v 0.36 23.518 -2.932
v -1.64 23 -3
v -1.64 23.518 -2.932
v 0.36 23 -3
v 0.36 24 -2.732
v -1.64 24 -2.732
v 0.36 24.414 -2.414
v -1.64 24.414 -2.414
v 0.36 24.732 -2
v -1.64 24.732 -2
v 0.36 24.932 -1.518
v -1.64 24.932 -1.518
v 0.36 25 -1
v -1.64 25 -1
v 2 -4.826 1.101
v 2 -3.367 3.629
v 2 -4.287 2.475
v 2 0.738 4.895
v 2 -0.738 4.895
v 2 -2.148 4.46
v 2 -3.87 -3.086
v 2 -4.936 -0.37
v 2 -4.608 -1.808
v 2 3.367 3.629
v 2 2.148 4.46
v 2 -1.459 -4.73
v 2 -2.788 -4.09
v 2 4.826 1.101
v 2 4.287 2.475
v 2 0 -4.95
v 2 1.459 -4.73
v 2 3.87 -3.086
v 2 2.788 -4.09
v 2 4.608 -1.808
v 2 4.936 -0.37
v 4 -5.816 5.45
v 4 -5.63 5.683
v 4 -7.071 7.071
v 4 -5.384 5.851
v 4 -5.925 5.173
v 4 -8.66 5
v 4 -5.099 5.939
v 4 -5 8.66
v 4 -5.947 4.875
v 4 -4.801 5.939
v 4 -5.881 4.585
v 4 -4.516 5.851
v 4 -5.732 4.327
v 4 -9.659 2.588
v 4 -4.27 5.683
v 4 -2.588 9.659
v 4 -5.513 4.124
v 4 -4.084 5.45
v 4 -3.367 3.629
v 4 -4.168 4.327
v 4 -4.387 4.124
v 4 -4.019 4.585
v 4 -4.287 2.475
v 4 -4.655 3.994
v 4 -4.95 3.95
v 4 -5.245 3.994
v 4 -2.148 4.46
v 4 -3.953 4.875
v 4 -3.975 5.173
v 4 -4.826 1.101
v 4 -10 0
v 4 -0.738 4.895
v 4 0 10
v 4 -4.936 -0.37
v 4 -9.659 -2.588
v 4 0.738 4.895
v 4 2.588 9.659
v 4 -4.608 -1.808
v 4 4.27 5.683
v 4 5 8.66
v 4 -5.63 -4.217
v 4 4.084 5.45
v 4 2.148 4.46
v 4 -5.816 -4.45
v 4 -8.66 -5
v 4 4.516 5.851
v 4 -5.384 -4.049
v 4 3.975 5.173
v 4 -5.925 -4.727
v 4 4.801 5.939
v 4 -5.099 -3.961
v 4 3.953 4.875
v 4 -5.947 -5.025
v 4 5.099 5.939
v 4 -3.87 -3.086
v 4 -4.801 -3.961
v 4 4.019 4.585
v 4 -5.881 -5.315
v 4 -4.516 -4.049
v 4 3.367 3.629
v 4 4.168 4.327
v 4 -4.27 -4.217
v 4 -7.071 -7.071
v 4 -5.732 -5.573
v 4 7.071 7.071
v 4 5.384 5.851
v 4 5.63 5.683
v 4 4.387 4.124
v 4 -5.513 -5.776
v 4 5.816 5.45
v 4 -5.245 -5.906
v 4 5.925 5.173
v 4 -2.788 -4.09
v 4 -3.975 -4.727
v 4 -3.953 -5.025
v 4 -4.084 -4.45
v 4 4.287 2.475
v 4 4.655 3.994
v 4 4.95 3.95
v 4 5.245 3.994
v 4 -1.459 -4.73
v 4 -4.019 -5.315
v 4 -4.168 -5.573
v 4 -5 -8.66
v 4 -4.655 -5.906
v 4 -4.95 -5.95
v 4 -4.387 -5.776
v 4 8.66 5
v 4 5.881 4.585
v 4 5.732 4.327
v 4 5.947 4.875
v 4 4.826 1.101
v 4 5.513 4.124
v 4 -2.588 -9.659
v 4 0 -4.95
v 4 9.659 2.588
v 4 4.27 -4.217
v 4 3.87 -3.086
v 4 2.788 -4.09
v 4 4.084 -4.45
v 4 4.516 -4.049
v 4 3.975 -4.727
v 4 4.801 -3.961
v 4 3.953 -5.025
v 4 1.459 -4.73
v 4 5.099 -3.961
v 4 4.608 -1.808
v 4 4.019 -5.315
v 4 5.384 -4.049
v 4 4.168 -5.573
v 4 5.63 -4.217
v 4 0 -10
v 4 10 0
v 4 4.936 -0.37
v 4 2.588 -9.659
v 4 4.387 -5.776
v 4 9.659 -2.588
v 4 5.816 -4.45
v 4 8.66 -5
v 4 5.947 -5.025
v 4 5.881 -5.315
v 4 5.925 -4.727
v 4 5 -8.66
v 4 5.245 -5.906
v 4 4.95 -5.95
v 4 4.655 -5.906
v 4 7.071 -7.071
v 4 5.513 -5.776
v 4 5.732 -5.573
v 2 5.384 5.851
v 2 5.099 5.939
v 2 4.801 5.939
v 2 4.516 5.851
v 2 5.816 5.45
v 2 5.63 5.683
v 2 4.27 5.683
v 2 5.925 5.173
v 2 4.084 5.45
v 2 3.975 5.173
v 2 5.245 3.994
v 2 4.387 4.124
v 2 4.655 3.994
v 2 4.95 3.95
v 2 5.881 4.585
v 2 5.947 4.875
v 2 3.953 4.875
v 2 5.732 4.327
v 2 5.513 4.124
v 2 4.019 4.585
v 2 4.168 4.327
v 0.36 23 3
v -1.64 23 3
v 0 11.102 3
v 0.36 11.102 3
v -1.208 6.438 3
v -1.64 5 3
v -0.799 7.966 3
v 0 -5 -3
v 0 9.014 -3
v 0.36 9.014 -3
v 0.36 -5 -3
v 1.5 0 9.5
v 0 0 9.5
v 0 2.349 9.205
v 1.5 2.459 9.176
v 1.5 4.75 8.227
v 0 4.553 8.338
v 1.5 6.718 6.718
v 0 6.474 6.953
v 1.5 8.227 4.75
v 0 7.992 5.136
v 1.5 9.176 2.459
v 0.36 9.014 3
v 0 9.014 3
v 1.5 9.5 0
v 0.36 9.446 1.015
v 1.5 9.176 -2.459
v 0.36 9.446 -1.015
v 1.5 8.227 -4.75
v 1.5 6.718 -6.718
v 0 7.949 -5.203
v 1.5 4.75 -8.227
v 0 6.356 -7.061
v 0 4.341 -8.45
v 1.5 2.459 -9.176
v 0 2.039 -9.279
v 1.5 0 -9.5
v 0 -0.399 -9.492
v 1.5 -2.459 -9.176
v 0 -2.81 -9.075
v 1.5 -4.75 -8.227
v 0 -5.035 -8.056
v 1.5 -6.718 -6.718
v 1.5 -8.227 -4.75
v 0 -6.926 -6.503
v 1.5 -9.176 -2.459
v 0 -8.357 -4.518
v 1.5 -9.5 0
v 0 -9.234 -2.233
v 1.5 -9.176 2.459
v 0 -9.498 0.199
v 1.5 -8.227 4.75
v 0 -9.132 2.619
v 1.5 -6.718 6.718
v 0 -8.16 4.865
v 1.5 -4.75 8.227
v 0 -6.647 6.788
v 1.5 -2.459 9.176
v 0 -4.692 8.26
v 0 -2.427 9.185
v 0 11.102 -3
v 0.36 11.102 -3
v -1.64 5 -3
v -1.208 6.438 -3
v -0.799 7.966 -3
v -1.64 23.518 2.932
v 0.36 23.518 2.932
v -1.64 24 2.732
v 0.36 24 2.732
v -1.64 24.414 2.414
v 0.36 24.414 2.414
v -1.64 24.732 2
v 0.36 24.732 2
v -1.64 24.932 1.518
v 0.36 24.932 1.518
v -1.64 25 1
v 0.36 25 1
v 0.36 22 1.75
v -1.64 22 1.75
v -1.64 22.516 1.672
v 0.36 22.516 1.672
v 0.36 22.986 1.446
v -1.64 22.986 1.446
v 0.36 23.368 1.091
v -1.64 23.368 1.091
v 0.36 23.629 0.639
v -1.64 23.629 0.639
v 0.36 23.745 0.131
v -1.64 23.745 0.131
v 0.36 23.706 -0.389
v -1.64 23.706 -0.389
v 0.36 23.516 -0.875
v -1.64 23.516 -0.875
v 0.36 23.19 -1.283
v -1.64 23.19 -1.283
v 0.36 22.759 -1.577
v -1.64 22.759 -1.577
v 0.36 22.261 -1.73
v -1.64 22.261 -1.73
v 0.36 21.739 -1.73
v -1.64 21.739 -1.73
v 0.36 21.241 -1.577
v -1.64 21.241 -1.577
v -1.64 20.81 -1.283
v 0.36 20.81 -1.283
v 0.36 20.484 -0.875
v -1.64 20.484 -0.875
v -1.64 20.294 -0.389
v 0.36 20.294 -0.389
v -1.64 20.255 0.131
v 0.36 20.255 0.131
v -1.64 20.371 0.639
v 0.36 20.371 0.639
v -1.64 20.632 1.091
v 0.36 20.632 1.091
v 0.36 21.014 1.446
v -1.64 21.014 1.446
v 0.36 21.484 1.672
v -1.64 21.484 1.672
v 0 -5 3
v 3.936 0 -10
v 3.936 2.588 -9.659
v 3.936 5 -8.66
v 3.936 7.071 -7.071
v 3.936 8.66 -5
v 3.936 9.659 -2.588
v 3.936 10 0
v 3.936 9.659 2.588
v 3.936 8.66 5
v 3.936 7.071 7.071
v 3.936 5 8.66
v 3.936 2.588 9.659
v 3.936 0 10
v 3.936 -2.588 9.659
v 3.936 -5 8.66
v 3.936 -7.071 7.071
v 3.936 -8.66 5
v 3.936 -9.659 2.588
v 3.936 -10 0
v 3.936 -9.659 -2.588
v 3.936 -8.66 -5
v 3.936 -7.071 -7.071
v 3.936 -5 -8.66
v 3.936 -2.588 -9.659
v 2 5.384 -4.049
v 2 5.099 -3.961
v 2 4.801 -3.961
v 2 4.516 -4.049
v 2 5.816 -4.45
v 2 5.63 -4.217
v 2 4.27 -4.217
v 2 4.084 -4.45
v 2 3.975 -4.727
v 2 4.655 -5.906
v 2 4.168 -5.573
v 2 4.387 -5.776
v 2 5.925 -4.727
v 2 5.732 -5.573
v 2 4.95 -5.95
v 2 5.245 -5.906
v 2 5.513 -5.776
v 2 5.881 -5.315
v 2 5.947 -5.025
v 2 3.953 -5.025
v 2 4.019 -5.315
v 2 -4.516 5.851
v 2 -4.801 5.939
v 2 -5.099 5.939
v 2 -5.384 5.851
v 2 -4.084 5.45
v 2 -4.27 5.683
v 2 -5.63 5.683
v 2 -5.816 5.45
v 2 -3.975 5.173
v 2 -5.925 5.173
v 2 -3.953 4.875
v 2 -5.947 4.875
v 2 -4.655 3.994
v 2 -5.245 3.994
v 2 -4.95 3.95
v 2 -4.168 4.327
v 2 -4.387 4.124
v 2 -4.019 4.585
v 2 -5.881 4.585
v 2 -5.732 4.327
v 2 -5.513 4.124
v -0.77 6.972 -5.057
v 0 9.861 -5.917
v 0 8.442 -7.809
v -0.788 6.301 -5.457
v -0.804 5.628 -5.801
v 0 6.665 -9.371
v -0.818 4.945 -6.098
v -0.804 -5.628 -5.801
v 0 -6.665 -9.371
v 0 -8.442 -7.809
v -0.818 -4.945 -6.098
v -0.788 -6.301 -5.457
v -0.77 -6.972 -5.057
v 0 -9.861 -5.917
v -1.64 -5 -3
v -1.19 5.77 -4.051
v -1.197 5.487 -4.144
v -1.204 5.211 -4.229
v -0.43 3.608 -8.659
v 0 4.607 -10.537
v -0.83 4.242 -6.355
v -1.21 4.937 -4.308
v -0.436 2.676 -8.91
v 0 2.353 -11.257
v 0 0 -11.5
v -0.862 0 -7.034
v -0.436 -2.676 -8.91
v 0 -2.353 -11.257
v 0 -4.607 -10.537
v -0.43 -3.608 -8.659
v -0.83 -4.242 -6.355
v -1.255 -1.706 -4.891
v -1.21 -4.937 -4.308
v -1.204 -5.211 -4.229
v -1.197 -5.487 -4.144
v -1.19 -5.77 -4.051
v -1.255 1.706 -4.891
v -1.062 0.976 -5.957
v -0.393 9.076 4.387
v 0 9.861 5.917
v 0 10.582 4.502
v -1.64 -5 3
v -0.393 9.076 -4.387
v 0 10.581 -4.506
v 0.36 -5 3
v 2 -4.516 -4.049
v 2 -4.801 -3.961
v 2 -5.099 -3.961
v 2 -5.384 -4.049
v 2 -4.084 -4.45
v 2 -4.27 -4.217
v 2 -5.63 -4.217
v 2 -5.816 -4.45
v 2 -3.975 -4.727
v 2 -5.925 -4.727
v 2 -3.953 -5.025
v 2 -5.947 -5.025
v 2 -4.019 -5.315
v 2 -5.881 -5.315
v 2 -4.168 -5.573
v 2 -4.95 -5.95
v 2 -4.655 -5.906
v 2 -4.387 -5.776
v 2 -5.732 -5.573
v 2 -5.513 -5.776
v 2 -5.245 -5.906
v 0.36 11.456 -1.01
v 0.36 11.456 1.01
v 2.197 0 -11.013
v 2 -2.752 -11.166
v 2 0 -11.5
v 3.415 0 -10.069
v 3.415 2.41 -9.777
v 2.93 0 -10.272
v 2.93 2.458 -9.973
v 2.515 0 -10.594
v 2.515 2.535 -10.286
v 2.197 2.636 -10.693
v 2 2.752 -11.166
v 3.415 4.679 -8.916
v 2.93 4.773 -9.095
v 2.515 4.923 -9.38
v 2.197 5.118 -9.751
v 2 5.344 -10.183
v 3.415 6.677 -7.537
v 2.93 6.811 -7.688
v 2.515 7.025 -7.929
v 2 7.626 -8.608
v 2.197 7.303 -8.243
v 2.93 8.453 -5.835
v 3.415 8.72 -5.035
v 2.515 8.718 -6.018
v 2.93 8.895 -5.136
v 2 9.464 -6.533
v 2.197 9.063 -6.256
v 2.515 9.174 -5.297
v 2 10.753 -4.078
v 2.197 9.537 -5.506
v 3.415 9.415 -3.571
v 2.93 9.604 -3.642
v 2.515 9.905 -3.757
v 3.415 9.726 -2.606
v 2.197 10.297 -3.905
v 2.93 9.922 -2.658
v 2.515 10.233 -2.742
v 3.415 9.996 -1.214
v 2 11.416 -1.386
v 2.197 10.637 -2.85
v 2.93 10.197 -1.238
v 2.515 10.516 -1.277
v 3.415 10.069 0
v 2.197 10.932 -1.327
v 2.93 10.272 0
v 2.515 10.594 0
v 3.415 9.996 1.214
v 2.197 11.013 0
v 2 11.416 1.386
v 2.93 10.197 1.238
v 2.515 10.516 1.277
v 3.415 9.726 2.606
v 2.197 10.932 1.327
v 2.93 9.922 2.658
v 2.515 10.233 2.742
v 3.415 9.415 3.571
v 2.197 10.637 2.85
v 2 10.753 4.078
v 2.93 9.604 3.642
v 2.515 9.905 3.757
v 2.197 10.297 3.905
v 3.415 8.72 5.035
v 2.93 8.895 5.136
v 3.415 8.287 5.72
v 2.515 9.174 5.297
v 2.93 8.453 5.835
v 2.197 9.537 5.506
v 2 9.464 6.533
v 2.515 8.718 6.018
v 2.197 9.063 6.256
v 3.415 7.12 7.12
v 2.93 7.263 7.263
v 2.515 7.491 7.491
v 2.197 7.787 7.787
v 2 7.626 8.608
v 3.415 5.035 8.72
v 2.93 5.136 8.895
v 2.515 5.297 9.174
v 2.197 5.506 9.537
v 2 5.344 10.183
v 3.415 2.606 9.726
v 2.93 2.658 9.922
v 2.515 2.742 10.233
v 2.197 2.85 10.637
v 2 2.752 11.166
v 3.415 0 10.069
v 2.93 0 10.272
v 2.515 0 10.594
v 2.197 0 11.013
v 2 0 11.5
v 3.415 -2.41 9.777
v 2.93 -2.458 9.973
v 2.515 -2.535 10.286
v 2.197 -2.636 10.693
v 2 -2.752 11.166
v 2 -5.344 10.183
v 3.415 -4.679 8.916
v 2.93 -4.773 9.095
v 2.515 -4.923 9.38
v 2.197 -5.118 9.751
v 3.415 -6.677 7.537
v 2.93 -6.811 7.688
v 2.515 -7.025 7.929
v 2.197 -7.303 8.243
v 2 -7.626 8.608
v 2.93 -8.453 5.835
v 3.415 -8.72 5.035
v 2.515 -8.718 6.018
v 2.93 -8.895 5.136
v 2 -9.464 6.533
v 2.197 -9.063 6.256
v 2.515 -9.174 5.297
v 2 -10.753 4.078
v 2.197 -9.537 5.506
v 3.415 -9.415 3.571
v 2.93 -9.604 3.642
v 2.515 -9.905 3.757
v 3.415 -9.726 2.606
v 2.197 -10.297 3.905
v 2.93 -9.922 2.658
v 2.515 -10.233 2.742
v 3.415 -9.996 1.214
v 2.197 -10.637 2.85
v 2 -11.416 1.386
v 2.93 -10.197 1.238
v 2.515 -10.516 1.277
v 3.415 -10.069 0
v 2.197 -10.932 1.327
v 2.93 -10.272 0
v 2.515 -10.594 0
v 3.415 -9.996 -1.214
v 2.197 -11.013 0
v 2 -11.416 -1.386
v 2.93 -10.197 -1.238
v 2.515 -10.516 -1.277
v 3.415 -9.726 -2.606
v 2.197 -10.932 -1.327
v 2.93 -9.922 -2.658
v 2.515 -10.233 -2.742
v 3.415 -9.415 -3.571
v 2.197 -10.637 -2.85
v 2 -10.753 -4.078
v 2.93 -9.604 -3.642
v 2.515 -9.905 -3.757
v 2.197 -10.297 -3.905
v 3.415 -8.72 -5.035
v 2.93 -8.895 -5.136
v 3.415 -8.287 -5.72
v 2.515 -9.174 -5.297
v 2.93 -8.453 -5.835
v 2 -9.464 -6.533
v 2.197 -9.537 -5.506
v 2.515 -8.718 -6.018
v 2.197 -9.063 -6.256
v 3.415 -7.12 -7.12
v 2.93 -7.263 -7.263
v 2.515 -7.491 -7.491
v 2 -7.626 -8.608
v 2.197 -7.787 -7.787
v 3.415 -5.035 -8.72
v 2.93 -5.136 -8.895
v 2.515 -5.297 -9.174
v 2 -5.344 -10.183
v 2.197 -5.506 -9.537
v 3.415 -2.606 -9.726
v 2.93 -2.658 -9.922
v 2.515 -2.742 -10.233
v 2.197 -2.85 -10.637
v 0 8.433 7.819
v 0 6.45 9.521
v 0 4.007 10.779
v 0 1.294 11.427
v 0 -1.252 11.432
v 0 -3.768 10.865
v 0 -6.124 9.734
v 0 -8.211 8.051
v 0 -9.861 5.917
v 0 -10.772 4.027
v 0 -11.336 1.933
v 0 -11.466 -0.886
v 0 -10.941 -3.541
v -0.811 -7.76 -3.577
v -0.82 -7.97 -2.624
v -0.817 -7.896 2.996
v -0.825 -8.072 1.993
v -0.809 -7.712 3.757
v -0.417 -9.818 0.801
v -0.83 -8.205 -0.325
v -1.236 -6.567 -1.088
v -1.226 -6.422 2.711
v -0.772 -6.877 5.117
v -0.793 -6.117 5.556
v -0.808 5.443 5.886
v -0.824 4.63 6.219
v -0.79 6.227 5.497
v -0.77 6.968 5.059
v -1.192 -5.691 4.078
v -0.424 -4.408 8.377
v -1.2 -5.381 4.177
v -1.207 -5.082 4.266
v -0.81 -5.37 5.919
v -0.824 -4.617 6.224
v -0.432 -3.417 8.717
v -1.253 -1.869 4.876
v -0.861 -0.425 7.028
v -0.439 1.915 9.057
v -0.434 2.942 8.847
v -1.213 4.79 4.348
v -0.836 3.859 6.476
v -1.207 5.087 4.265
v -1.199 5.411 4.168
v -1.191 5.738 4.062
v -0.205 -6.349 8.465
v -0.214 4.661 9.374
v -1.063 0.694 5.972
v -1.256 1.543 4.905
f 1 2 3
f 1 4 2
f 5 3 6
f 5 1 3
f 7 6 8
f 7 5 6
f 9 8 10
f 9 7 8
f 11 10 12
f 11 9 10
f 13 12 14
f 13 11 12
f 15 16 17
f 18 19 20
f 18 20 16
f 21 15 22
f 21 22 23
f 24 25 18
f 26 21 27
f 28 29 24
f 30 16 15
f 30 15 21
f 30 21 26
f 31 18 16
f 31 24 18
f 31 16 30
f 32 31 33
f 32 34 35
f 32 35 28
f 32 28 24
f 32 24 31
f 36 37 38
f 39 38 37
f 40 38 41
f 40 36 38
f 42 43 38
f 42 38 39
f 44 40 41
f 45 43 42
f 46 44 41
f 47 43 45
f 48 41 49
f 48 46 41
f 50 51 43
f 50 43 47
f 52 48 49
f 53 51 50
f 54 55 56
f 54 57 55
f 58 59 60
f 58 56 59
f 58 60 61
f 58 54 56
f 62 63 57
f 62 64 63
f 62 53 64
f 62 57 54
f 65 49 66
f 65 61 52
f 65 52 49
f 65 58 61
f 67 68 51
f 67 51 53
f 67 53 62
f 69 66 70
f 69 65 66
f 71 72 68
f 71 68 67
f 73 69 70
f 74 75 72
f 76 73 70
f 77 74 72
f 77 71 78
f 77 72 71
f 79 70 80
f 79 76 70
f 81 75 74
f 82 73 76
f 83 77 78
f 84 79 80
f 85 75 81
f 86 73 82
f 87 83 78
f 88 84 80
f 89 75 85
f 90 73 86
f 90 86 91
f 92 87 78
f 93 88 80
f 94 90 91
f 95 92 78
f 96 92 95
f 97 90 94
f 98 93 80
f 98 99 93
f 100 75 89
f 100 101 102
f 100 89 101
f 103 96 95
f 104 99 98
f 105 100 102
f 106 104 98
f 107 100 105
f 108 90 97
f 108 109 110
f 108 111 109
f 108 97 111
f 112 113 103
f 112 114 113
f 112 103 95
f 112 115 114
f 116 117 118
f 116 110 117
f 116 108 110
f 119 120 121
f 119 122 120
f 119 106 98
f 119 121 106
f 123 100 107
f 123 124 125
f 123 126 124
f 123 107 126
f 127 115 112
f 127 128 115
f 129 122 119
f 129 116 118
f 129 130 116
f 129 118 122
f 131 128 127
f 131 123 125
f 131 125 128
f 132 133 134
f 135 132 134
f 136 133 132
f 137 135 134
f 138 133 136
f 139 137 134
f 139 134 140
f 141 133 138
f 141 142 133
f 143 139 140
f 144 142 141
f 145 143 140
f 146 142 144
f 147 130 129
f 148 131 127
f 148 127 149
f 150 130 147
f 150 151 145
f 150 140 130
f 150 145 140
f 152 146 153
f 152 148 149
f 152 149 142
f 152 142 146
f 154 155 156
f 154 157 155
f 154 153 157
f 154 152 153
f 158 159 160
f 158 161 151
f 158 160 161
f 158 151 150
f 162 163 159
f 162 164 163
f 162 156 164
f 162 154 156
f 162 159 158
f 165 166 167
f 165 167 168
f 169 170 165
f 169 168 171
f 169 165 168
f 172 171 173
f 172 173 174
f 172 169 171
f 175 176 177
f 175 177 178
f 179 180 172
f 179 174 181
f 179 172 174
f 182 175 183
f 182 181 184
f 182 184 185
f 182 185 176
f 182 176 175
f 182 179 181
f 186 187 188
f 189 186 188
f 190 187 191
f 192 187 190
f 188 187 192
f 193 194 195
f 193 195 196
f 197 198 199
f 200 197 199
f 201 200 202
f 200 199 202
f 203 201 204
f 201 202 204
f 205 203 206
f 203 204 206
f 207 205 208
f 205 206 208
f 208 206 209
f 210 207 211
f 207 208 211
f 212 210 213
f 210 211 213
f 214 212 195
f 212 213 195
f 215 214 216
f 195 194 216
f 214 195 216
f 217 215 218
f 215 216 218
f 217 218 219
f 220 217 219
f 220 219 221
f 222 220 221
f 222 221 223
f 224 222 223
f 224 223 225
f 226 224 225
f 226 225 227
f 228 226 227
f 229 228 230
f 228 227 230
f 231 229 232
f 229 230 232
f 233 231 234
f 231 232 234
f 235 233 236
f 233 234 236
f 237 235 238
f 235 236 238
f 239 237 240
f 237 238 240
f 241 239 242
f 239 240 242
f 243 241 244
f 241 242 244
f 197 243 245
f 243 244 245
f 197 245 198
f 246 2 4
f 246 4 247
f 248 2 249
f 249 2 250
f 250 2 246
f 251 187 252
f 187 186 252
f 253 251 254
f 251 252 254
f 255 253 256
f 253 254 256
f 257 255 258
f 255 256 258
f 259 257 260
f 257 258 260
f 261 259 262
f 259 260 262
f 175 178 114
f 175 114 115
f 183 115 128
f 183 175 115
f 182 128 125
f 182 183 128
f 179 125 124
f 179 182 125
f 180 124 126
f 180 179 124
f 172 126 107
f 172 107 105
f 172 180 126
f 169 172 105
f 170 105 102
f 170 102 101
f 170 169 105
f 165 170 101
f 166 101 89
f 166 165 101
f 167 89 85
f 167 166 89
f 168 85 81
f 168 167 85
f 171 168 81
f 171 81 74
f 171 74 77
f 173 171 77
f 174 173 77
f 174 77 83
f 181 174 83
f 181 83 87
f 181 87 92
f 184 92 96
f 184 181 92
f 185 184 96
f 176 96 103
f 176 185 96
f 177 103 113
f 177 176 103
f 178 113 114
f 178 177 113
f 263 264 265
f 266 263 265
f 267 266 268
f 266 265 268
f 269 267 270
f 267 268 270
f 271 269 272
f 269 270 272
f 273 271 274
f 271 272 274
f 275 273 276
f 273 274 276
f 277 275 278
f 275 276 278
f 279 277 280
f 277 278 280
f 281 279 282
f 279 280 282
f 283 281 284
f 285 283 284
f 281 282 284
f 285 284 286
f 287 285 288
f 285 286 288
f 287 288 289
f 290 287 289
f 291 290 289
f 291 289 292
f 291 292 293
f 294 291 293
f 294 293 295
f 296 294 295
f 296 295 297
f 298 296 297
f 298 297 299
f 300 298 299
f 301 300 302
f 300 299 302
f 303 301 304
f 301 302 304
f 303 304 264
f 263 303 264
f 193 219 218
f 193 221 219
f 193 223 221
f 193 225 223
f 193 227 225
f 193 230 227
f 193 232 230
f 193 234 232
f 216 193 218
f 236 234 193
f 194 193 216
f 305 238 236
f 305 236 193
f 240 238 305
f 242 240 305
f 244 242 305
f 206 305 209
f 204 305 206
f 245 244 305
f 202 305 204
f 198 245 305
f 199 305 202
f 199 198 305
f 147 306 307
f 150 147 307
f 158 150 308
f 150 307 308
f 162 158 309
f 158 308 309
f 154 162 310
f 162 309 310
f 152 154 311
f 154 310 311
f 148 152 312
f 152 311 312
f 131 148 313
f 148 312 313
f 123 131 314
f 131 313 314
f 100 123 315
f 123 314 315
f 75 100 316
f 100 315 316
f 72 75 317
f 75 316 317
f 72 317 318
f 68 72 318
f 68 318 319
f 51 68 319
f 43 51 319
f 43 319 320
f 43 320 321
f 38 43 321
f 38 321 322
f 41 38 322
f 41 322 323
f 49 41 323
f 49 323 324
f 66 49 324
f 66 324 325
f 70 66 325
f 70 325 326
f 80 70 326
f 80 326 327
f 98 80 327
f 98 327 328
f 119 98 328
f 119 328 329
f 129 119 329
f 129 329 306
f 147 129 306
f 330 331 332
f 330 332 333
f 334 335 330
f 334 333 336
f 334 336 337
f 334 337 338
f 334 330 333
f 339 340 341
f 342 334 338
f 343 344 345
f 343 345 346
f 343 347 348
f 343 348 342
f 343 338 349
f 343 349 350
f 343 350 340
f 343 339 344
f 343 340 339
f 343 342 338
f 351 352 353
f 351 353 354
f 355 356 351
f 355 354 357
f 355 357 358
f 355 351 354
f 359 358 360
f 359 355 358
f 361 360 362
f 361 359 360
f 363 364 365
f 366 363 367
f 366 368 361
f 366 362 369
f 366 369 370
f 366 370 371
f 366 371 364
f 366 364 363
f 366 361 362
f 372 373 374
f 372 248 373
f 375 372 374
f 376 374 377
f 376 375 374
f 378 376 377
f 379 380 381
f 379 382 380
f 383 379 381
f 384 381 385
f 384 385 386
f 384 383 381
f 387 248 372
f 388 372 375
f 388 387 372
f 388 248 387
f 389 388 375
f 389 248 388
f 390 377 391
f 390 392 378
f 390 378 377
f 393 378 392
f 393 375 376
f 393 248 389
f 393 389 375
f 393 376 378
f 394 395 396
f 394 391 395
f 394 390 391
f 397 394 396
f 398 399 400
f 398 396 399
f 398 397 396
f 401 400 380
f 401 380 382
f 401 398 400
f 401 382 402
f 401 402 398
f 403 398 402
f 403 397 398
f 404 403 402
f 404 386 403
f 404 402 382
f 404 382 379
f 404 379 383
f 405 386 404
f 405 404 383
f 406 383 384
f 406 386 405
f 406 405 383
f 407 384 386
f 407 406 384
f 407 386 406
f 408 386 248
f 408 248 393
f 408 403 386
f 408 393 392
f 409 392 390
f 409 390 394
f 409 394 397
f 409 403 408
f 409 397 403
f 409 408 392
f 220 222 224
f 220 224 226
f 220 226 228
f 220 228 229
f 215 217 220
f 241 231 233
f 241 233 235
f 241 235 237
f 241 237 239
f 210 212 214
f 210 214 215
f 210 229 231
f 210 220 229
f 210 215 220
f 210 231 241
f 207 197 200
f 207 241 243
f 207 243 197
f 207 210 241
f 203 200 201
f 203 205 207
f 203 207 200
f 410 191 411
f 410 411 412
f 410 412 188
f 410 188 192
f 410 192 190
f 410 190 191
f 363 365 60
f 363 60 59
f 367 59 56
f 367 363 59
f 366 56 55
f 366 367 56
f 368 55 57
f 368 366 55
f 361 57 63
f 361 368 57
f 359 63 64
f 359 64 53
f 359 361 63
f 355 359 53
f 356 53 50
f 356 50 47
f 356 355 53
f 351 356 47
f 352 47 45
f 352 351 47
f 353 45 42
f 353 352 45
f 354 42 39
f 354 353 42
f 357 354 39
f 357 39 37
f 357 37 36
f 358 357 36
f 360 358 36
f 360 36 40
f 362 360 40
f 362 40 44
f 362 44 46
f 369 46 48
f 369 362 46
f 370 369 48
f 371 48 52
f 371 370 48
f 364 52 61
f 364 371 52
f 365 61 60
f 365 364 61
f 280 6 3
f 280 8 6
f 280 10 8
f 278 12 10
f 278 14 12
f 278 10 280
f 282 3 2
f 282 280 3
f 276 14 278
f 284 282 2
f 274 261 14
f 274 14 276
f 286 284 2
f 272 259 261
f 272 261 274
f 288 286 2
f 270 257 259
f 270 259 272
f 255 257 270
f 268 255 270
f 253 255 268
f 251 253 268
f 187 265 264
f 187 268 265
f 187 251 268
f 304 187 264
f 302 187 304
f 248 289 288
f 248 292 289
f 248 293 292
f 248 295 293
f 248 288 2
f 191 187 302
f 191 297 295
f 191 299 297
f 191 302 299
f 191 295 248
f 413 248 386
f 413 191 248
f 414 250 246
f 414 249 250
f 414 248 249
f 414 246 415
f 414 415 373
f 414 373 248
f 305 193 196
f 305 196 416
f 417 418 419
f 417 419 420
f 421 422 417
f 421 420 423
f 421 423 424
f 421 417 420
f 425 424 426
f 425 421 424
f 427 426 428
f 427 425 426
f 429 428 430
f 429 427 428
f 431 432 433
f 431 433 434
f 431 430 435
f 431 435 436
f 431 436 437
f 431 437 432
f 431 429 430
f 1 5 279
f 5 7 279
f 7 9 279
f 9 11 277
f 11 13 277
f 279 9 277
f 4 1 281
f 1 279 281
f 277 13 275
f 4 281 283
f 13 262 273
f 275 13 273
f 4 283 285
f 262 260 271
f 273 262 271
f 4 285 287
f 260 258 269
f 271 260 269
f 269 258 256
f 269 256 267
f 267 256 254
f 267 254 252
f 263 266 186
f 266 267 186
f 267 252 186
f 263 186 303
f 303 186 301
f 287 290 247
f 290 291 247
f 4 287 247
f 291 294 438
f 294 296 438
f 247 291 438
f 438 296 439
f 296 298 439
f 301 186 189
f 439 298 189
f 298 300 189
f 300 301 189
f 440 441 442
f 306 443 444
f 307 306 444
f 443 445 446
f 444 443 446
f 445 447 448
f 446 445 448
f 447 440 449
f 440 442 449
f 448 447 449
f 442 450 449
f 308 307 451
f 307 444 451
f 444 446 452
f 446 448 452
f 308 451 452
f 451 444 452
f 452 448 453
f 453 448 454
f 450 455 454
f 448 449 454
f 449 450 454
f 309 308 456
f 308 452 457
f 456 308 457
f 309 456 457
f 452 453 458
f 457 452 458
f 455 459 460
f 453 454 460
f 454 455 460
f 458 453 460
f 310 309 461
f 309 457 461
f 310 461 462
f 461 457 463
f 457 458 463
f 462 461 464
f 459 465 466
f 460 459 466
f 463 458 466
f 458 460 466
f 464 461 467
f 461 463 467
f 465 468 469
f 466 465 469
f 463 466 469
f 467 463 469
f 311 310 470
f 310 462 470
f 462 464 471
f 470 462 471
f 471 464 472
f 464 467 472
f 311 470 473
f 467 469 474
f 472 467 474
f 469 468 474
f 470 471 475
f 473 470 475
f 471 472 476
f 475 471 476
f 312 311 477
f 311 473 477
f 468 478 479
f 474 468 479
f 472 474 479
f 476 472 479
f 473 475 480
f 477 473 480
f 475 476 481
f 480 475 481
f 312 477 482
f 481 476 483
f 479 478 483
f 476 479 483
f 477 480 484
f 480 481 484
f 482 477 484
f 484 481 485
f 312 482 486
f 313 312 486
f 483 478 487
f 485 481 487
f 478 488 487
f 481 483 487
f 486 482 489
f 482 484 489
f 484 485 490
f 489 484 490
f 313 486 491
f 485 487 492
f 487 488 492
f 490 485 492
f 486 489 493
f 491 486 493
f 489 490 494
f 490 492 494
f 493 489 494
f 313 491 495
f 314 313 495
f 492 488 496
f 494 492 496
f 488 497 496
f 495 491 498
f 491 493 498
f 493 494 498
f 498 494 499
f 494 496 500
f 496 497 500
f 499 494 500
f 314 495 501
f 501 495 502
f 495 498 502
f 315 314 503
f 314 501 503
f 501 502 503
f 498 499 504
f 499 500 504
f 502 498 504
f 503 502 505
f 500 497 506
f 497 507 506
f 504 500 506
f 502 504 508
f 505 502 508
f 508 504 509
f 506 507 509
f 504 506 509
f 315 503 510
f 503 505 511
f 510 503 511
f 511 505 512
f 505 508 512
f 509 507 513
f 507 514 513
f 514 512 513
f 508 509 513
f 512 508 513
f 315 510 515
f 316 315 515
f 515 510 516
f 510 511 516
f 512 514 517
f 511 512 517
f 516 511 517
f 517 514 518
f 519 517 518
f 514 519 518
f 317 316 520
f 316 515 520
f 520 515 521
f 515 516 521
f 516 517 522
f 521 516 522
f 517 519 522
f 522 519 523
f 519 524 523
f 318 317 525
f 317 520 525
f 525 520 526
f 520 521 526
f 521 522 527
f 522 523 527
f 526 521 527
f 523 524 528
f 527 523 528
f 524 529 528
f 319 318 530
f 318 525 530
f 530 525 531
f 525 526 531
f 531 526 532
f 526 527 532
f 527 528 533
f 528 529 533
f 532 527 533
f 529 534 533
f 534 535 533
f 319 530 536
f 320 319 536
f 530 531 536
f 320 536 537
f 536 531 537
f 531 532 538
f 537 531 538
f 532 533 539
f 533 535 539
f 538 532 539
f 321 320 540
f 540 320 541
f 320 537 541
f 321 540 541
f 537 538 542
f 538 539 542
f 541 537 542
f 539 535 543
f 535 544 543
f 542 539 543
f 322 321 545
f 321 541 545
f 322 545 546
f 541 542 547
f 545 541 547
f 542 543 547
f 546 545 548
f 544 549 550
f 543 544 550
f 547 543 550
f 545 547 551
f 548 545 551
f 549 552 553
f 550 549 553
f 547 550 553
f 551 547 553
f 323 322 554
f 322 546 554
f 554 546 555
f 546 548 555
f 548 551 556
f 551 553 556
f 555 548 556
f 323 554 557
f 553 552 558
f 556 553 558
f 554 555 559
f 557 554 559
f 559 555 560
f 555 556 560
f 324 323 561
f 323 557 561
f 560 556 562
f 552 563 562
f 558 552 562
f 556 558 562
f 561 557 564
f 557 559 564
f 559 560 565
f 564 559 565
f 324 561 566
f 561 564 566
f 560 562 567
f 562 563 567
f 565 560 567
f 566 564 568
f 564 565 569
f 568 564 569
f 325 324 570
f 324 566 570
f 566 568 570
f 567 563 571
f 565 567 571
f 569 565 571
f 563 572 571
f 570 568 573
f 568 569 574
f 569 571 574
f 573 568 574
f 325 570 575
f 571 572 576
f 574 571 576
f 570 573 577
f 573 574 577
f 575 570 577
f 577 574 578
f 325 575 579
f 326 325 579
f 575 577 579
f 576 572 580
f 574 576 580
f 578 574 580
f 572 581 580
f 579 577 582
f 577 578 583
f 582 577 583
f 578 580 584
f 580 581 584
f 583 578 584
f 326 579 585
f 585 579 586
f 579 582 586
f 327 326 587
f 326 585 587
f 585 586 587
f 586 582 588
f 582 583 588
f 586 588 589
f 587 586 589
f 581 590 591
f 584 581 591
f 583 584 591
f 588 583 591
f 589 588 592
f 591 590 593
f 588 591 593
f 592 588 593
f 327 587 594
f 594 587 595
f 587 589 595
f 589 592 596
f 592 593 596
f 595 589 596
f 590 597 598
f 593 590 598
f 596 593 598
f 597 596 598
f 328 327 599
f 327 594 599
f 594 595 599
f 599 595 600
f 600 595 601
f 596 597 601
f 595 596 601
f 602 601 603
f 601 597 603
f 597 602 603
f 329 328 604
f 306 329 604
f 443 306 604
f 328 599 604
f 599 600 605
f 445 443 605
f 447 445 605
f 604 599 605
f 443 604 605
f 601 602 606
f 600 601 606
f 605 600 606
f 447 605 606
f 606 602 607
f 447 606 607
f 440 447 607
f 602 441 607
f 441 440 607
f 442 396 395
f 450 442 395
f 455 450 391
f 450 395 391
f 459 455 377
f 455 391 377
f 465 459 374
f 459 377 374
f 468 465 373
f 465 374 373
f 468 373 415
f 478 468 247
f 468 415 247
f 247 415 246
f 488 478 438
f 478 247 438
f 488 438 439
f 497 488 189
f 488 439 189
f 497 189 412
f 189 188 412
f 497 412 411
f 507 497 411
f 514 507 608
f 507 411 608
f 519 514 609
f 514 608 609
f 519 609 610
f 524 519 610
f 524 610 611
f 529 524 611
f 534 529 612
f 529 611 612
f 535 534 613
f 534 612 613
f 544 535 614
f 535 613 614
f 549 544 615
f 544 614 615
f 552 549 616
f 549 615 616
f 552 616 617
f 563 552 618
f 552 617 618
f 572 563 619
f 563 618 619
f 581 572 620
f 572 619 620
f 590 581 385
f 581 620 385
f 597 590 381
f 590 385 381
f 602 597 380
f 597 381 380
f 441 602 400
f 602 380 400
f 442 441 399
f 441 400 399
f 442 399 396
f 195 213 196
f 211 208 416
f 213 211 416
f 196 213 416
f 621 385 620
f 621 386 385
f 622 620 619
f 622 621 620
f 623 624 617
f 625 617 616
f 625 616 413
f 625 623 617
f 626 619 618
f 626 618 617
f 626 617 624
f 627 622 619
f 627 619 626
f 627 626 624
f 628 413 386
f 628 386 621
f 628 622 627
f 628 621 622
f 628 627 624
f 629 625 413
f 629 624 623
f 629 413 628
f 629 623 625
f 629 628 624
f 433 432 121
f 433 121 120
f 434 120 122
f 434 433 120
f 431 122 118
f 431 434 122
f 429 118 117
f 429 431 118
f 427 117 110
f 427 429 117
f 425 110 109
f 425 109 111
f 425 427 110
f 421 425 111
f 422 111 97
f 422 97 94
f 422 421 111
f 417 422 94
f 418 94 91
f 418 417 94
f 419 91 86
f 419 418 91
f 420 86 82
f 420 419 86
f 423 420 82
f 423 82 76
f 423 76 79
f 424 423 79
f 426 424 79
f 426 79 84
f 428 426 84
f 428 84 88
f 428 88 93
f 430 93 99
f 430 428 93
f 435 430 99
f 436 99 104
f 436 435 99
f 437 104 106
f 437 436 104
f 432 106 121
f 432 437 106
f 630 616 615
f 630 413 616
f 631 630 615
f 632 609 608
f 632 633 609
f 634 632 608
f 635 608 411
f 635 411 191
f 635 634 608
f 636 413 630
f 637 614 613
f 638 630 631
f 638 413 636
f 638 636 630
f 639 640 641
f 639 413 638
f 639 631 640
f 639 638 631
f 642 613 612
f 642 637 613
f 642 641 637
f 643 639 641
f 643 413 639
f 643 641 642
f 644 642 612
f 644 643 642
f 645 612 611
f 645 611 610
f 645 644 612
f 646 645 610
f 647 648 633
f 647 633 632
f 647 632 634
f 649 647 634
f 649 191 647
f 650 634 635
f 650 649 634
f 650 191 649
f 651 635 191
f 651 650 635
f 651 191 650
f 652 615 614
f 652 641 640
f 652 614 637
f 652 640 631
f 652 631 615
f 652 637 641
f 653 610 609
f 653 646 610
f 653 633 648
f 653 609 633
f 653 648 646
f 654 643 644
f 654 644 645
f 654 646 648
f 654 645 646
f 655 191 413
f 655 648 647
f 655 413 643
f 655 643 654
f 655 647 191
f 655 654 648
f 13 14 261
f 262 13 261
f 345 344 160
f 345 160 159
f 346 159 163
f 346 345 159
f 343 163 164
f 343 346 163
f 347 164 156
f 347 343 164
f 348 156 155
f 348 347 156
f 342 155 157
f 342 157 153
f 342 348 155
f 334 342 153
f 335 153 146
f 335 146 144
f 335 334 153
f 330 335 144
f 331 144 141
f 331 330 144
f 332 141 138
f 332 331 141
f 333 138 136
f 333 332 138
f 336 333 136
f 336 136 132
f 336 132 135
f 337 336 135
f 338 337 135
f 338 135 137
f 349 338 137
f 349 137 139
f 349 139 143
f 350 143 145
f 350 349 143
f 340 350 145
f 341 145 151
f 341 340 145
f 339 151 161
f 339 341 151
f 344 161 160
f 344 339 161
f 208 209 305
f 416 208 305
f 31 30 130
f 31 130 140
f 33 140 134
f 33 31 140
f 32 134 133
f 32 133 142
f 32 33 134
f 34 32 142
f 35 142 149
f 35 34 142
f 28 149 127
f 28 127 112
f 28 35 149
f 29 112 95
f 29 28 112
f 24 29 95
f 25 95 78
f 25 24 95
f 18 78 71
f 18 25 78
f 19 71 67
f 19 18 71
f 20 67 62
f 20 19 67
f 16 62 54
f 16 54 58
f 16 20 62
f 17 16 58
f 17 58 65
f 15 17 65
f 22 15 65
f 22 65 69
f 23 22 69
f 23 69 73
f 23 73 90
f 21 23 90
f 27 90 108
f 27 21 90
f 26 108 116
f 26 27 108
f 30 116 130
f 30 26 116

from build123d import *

# Parameters (mm, degrees)
SKETCH1_R           = 11.5
SKETCH1_R_2         = 10.5
BOSS_EXTRUDE1_DEPTH = 2
SKETCH1_2_R         = 10.5
BOSS_EXTRUDE2_DEPTH = 2
SKETCH3_R           = 9.5
CUT_EXTRUDE2_DEPTH  = 1.5
SKETCH6_W           = 30
SKETCH6_H           = 6
SKETCH6_R           = 1.75
BOSS_EXTRUDE3_DEPTH = 2
SKETCH7_R           = 10
SKETCH7_R_2         = 1
SKETCH7_R_3         = 4.95
BOSS_EXTRUDE4_DEPTH = 2
FILLET1_R           = 2
FILLET2_R           = 2


with BuildPart() as part:
    # Sketch1 → Boss-Extrude1 (new body)
    with BuildSketch(Plane.YZ):
        with Locations(Location((0, 0, 0), (0, 0, 270))):
            Circle(SKETCH1_R)
        with Locations(Location((0, 0, 0), (0, 0, 270))):
            Circle(SKETCH1_R_2, mode=Mode.SUBTRACT)
    extrude(amount=BOSS_EXTRUDE1_DEPTH)

    # Sketch1<2> → Boss-Extrude2 (add)
    with BuildSketch(Plane.YZ):
        Circle(SKETCH1_2_R)
    extrude(amount=BOSS_EXTRUDE2_DEPTH)

    # Sketch3 → Cut-Extrude2 (cut)
    with BuildSketch(Plane(origin=(0, 0, 0), x_dir=(0, -1, 0), z_dir=(-1, 0, 0))):
        with Locations(Location((0, 0, 0), (0, 0, 90))):
            Circle(SKETCH3_R)
    extrude(amount=-CUT_EXTRUDE2_DEPTH, mode=Mode.SUBTRACT)

    # Sketch4 for Loft1 → Loft1 section 0
    with BuildSketch(Plane(origin=(0, 0, 0), x_dir=(0, -1, 0), z_dir=(-1, 0, 0))):
        with BuildLine():
            # circular arc as an exact rational Bezier (weights 1, cos(half-angle), 1)
            Bezier((9.861168646, -5.916701187), (13.411189358, 0), (9.861168646, 5.916701187), weights=[1, 0.857492926, 1])
            Bezier((9.861168646, 5.916701187), (0, 22.351982265), (-9.861168646, 5.916701187), weights=[1, 0.514495755, 1])
            Bezier((-9.861168646, 5.916701187), (-13.411189358, 0), (-9.861168646, -5.916701187), weights=[1, 0.857492926, 1])
            Bezier((-9.861168646, -5.916701187), (0, -22.351982265), (9.861168646, -5.916701187), weights=[1, 0.514495755, 1])
        make_face()
    # Sketch2 → Loft1 section 1
    with BuildSketch(Plane.ZY.offset(1.64)):
        with BuildLine():
            Line((-3, -5), (3, -5))
            Line((3, -5), (3, 5))
            Line((3, 5), (-3, 5))
            Line((-3, 5), (-3, -5))
        make_face()
    loft()

    # Sketch6 → Boss-Extrude3 (add)
    with BuildSketch(Plane(origin=(-1.64, 0, 0), x_dir=(0, -1, 0), z_dir=(-1, 0, 0))):
        with Locations((-10, 0)):
            Rectangle(SKETCH6_W, SKETCH6_H)
        with Locations(Location((-22, 0, 0), (0, 0, 90))):
            Circle(SKETCH6_R, mode=Mode.SUBTRACT)
    extrude(amount=-BOSS_EXTRUDE3_DEPTH)

    # Sketch7 → Boss-Extrude4 (add)
    with BuildSketch(Plane.YZ.offset(2)):
        with Locations(Location((0, 0, 0), (0, 0, 270))):
            Circle(SKETCH7_R)
        with Locations(Location((-4.95, 4.95, 0), (0, 0, 270))):
            Circle(SKETCH7_R_2, mode=Mode.SUBTRACT)
        with Locations(Location((4.95, 4.95, 0), (0, 0, 270))):
            Circle(SKETCH7_R_2, mode=Mode.SUBTRACT)
        with Locations(Location((4.95, -4.95, 0), (0, 0, 270))):
            Circle(SKETCH7_R_2, mode=Mode.SUBTRACT)
        with Locations(Location((-4.95, -4.95, 0), (0, 0, 270))):
            Circle(SKETCH7_R_2, mode=Mode.SUBTRACT)
        with Locations(Location((0, 0, 0), (0, 0, 270))):
            Circle(SKETCH7_R_3, mode=Mode.SUBTRACT)
    extrude(amount=BOSS_EXTRUDE4_DEPTH)

    # Fillet1
    # the kernel refuses this fillet: 2 mm, written as the material it adds along each edge
    with BuildSketch(Plane(origin=(2, 0, 0), x_dir=(0, 0, -1), z_dir=(0, -1, 0))) as fillet1_piece_1:
        with BuildLine():
            CenterArc((12, 1.936491673), FILLET1_R, 180, 75.522487814)
            Line((10, 1.936491673), (9.96, 1.936491673))
            Line((9.96, 1.936491673), (9.96, 0))
            Line((9.96, 0), (10, -0.04))
            ThreePointArc((10, -0.04), (10.75, -0.04), (11.49, -0.038729833))
            Line((11.49, -0.038729833), (11.5, 0))
        make_face()
    revolve(axis=Axis((2, 0, 0), (1, 0, 0)))

    # Fillet2
    fillet2_edges = [part.edges().sort_by_distance(p)[0] for p in [
        (-0.64, 25, 3),
        (-0.64, 25, -3),
    ]]
    fillet(fillet2_edges, radius=FILLET2_R)


solid = part.part
